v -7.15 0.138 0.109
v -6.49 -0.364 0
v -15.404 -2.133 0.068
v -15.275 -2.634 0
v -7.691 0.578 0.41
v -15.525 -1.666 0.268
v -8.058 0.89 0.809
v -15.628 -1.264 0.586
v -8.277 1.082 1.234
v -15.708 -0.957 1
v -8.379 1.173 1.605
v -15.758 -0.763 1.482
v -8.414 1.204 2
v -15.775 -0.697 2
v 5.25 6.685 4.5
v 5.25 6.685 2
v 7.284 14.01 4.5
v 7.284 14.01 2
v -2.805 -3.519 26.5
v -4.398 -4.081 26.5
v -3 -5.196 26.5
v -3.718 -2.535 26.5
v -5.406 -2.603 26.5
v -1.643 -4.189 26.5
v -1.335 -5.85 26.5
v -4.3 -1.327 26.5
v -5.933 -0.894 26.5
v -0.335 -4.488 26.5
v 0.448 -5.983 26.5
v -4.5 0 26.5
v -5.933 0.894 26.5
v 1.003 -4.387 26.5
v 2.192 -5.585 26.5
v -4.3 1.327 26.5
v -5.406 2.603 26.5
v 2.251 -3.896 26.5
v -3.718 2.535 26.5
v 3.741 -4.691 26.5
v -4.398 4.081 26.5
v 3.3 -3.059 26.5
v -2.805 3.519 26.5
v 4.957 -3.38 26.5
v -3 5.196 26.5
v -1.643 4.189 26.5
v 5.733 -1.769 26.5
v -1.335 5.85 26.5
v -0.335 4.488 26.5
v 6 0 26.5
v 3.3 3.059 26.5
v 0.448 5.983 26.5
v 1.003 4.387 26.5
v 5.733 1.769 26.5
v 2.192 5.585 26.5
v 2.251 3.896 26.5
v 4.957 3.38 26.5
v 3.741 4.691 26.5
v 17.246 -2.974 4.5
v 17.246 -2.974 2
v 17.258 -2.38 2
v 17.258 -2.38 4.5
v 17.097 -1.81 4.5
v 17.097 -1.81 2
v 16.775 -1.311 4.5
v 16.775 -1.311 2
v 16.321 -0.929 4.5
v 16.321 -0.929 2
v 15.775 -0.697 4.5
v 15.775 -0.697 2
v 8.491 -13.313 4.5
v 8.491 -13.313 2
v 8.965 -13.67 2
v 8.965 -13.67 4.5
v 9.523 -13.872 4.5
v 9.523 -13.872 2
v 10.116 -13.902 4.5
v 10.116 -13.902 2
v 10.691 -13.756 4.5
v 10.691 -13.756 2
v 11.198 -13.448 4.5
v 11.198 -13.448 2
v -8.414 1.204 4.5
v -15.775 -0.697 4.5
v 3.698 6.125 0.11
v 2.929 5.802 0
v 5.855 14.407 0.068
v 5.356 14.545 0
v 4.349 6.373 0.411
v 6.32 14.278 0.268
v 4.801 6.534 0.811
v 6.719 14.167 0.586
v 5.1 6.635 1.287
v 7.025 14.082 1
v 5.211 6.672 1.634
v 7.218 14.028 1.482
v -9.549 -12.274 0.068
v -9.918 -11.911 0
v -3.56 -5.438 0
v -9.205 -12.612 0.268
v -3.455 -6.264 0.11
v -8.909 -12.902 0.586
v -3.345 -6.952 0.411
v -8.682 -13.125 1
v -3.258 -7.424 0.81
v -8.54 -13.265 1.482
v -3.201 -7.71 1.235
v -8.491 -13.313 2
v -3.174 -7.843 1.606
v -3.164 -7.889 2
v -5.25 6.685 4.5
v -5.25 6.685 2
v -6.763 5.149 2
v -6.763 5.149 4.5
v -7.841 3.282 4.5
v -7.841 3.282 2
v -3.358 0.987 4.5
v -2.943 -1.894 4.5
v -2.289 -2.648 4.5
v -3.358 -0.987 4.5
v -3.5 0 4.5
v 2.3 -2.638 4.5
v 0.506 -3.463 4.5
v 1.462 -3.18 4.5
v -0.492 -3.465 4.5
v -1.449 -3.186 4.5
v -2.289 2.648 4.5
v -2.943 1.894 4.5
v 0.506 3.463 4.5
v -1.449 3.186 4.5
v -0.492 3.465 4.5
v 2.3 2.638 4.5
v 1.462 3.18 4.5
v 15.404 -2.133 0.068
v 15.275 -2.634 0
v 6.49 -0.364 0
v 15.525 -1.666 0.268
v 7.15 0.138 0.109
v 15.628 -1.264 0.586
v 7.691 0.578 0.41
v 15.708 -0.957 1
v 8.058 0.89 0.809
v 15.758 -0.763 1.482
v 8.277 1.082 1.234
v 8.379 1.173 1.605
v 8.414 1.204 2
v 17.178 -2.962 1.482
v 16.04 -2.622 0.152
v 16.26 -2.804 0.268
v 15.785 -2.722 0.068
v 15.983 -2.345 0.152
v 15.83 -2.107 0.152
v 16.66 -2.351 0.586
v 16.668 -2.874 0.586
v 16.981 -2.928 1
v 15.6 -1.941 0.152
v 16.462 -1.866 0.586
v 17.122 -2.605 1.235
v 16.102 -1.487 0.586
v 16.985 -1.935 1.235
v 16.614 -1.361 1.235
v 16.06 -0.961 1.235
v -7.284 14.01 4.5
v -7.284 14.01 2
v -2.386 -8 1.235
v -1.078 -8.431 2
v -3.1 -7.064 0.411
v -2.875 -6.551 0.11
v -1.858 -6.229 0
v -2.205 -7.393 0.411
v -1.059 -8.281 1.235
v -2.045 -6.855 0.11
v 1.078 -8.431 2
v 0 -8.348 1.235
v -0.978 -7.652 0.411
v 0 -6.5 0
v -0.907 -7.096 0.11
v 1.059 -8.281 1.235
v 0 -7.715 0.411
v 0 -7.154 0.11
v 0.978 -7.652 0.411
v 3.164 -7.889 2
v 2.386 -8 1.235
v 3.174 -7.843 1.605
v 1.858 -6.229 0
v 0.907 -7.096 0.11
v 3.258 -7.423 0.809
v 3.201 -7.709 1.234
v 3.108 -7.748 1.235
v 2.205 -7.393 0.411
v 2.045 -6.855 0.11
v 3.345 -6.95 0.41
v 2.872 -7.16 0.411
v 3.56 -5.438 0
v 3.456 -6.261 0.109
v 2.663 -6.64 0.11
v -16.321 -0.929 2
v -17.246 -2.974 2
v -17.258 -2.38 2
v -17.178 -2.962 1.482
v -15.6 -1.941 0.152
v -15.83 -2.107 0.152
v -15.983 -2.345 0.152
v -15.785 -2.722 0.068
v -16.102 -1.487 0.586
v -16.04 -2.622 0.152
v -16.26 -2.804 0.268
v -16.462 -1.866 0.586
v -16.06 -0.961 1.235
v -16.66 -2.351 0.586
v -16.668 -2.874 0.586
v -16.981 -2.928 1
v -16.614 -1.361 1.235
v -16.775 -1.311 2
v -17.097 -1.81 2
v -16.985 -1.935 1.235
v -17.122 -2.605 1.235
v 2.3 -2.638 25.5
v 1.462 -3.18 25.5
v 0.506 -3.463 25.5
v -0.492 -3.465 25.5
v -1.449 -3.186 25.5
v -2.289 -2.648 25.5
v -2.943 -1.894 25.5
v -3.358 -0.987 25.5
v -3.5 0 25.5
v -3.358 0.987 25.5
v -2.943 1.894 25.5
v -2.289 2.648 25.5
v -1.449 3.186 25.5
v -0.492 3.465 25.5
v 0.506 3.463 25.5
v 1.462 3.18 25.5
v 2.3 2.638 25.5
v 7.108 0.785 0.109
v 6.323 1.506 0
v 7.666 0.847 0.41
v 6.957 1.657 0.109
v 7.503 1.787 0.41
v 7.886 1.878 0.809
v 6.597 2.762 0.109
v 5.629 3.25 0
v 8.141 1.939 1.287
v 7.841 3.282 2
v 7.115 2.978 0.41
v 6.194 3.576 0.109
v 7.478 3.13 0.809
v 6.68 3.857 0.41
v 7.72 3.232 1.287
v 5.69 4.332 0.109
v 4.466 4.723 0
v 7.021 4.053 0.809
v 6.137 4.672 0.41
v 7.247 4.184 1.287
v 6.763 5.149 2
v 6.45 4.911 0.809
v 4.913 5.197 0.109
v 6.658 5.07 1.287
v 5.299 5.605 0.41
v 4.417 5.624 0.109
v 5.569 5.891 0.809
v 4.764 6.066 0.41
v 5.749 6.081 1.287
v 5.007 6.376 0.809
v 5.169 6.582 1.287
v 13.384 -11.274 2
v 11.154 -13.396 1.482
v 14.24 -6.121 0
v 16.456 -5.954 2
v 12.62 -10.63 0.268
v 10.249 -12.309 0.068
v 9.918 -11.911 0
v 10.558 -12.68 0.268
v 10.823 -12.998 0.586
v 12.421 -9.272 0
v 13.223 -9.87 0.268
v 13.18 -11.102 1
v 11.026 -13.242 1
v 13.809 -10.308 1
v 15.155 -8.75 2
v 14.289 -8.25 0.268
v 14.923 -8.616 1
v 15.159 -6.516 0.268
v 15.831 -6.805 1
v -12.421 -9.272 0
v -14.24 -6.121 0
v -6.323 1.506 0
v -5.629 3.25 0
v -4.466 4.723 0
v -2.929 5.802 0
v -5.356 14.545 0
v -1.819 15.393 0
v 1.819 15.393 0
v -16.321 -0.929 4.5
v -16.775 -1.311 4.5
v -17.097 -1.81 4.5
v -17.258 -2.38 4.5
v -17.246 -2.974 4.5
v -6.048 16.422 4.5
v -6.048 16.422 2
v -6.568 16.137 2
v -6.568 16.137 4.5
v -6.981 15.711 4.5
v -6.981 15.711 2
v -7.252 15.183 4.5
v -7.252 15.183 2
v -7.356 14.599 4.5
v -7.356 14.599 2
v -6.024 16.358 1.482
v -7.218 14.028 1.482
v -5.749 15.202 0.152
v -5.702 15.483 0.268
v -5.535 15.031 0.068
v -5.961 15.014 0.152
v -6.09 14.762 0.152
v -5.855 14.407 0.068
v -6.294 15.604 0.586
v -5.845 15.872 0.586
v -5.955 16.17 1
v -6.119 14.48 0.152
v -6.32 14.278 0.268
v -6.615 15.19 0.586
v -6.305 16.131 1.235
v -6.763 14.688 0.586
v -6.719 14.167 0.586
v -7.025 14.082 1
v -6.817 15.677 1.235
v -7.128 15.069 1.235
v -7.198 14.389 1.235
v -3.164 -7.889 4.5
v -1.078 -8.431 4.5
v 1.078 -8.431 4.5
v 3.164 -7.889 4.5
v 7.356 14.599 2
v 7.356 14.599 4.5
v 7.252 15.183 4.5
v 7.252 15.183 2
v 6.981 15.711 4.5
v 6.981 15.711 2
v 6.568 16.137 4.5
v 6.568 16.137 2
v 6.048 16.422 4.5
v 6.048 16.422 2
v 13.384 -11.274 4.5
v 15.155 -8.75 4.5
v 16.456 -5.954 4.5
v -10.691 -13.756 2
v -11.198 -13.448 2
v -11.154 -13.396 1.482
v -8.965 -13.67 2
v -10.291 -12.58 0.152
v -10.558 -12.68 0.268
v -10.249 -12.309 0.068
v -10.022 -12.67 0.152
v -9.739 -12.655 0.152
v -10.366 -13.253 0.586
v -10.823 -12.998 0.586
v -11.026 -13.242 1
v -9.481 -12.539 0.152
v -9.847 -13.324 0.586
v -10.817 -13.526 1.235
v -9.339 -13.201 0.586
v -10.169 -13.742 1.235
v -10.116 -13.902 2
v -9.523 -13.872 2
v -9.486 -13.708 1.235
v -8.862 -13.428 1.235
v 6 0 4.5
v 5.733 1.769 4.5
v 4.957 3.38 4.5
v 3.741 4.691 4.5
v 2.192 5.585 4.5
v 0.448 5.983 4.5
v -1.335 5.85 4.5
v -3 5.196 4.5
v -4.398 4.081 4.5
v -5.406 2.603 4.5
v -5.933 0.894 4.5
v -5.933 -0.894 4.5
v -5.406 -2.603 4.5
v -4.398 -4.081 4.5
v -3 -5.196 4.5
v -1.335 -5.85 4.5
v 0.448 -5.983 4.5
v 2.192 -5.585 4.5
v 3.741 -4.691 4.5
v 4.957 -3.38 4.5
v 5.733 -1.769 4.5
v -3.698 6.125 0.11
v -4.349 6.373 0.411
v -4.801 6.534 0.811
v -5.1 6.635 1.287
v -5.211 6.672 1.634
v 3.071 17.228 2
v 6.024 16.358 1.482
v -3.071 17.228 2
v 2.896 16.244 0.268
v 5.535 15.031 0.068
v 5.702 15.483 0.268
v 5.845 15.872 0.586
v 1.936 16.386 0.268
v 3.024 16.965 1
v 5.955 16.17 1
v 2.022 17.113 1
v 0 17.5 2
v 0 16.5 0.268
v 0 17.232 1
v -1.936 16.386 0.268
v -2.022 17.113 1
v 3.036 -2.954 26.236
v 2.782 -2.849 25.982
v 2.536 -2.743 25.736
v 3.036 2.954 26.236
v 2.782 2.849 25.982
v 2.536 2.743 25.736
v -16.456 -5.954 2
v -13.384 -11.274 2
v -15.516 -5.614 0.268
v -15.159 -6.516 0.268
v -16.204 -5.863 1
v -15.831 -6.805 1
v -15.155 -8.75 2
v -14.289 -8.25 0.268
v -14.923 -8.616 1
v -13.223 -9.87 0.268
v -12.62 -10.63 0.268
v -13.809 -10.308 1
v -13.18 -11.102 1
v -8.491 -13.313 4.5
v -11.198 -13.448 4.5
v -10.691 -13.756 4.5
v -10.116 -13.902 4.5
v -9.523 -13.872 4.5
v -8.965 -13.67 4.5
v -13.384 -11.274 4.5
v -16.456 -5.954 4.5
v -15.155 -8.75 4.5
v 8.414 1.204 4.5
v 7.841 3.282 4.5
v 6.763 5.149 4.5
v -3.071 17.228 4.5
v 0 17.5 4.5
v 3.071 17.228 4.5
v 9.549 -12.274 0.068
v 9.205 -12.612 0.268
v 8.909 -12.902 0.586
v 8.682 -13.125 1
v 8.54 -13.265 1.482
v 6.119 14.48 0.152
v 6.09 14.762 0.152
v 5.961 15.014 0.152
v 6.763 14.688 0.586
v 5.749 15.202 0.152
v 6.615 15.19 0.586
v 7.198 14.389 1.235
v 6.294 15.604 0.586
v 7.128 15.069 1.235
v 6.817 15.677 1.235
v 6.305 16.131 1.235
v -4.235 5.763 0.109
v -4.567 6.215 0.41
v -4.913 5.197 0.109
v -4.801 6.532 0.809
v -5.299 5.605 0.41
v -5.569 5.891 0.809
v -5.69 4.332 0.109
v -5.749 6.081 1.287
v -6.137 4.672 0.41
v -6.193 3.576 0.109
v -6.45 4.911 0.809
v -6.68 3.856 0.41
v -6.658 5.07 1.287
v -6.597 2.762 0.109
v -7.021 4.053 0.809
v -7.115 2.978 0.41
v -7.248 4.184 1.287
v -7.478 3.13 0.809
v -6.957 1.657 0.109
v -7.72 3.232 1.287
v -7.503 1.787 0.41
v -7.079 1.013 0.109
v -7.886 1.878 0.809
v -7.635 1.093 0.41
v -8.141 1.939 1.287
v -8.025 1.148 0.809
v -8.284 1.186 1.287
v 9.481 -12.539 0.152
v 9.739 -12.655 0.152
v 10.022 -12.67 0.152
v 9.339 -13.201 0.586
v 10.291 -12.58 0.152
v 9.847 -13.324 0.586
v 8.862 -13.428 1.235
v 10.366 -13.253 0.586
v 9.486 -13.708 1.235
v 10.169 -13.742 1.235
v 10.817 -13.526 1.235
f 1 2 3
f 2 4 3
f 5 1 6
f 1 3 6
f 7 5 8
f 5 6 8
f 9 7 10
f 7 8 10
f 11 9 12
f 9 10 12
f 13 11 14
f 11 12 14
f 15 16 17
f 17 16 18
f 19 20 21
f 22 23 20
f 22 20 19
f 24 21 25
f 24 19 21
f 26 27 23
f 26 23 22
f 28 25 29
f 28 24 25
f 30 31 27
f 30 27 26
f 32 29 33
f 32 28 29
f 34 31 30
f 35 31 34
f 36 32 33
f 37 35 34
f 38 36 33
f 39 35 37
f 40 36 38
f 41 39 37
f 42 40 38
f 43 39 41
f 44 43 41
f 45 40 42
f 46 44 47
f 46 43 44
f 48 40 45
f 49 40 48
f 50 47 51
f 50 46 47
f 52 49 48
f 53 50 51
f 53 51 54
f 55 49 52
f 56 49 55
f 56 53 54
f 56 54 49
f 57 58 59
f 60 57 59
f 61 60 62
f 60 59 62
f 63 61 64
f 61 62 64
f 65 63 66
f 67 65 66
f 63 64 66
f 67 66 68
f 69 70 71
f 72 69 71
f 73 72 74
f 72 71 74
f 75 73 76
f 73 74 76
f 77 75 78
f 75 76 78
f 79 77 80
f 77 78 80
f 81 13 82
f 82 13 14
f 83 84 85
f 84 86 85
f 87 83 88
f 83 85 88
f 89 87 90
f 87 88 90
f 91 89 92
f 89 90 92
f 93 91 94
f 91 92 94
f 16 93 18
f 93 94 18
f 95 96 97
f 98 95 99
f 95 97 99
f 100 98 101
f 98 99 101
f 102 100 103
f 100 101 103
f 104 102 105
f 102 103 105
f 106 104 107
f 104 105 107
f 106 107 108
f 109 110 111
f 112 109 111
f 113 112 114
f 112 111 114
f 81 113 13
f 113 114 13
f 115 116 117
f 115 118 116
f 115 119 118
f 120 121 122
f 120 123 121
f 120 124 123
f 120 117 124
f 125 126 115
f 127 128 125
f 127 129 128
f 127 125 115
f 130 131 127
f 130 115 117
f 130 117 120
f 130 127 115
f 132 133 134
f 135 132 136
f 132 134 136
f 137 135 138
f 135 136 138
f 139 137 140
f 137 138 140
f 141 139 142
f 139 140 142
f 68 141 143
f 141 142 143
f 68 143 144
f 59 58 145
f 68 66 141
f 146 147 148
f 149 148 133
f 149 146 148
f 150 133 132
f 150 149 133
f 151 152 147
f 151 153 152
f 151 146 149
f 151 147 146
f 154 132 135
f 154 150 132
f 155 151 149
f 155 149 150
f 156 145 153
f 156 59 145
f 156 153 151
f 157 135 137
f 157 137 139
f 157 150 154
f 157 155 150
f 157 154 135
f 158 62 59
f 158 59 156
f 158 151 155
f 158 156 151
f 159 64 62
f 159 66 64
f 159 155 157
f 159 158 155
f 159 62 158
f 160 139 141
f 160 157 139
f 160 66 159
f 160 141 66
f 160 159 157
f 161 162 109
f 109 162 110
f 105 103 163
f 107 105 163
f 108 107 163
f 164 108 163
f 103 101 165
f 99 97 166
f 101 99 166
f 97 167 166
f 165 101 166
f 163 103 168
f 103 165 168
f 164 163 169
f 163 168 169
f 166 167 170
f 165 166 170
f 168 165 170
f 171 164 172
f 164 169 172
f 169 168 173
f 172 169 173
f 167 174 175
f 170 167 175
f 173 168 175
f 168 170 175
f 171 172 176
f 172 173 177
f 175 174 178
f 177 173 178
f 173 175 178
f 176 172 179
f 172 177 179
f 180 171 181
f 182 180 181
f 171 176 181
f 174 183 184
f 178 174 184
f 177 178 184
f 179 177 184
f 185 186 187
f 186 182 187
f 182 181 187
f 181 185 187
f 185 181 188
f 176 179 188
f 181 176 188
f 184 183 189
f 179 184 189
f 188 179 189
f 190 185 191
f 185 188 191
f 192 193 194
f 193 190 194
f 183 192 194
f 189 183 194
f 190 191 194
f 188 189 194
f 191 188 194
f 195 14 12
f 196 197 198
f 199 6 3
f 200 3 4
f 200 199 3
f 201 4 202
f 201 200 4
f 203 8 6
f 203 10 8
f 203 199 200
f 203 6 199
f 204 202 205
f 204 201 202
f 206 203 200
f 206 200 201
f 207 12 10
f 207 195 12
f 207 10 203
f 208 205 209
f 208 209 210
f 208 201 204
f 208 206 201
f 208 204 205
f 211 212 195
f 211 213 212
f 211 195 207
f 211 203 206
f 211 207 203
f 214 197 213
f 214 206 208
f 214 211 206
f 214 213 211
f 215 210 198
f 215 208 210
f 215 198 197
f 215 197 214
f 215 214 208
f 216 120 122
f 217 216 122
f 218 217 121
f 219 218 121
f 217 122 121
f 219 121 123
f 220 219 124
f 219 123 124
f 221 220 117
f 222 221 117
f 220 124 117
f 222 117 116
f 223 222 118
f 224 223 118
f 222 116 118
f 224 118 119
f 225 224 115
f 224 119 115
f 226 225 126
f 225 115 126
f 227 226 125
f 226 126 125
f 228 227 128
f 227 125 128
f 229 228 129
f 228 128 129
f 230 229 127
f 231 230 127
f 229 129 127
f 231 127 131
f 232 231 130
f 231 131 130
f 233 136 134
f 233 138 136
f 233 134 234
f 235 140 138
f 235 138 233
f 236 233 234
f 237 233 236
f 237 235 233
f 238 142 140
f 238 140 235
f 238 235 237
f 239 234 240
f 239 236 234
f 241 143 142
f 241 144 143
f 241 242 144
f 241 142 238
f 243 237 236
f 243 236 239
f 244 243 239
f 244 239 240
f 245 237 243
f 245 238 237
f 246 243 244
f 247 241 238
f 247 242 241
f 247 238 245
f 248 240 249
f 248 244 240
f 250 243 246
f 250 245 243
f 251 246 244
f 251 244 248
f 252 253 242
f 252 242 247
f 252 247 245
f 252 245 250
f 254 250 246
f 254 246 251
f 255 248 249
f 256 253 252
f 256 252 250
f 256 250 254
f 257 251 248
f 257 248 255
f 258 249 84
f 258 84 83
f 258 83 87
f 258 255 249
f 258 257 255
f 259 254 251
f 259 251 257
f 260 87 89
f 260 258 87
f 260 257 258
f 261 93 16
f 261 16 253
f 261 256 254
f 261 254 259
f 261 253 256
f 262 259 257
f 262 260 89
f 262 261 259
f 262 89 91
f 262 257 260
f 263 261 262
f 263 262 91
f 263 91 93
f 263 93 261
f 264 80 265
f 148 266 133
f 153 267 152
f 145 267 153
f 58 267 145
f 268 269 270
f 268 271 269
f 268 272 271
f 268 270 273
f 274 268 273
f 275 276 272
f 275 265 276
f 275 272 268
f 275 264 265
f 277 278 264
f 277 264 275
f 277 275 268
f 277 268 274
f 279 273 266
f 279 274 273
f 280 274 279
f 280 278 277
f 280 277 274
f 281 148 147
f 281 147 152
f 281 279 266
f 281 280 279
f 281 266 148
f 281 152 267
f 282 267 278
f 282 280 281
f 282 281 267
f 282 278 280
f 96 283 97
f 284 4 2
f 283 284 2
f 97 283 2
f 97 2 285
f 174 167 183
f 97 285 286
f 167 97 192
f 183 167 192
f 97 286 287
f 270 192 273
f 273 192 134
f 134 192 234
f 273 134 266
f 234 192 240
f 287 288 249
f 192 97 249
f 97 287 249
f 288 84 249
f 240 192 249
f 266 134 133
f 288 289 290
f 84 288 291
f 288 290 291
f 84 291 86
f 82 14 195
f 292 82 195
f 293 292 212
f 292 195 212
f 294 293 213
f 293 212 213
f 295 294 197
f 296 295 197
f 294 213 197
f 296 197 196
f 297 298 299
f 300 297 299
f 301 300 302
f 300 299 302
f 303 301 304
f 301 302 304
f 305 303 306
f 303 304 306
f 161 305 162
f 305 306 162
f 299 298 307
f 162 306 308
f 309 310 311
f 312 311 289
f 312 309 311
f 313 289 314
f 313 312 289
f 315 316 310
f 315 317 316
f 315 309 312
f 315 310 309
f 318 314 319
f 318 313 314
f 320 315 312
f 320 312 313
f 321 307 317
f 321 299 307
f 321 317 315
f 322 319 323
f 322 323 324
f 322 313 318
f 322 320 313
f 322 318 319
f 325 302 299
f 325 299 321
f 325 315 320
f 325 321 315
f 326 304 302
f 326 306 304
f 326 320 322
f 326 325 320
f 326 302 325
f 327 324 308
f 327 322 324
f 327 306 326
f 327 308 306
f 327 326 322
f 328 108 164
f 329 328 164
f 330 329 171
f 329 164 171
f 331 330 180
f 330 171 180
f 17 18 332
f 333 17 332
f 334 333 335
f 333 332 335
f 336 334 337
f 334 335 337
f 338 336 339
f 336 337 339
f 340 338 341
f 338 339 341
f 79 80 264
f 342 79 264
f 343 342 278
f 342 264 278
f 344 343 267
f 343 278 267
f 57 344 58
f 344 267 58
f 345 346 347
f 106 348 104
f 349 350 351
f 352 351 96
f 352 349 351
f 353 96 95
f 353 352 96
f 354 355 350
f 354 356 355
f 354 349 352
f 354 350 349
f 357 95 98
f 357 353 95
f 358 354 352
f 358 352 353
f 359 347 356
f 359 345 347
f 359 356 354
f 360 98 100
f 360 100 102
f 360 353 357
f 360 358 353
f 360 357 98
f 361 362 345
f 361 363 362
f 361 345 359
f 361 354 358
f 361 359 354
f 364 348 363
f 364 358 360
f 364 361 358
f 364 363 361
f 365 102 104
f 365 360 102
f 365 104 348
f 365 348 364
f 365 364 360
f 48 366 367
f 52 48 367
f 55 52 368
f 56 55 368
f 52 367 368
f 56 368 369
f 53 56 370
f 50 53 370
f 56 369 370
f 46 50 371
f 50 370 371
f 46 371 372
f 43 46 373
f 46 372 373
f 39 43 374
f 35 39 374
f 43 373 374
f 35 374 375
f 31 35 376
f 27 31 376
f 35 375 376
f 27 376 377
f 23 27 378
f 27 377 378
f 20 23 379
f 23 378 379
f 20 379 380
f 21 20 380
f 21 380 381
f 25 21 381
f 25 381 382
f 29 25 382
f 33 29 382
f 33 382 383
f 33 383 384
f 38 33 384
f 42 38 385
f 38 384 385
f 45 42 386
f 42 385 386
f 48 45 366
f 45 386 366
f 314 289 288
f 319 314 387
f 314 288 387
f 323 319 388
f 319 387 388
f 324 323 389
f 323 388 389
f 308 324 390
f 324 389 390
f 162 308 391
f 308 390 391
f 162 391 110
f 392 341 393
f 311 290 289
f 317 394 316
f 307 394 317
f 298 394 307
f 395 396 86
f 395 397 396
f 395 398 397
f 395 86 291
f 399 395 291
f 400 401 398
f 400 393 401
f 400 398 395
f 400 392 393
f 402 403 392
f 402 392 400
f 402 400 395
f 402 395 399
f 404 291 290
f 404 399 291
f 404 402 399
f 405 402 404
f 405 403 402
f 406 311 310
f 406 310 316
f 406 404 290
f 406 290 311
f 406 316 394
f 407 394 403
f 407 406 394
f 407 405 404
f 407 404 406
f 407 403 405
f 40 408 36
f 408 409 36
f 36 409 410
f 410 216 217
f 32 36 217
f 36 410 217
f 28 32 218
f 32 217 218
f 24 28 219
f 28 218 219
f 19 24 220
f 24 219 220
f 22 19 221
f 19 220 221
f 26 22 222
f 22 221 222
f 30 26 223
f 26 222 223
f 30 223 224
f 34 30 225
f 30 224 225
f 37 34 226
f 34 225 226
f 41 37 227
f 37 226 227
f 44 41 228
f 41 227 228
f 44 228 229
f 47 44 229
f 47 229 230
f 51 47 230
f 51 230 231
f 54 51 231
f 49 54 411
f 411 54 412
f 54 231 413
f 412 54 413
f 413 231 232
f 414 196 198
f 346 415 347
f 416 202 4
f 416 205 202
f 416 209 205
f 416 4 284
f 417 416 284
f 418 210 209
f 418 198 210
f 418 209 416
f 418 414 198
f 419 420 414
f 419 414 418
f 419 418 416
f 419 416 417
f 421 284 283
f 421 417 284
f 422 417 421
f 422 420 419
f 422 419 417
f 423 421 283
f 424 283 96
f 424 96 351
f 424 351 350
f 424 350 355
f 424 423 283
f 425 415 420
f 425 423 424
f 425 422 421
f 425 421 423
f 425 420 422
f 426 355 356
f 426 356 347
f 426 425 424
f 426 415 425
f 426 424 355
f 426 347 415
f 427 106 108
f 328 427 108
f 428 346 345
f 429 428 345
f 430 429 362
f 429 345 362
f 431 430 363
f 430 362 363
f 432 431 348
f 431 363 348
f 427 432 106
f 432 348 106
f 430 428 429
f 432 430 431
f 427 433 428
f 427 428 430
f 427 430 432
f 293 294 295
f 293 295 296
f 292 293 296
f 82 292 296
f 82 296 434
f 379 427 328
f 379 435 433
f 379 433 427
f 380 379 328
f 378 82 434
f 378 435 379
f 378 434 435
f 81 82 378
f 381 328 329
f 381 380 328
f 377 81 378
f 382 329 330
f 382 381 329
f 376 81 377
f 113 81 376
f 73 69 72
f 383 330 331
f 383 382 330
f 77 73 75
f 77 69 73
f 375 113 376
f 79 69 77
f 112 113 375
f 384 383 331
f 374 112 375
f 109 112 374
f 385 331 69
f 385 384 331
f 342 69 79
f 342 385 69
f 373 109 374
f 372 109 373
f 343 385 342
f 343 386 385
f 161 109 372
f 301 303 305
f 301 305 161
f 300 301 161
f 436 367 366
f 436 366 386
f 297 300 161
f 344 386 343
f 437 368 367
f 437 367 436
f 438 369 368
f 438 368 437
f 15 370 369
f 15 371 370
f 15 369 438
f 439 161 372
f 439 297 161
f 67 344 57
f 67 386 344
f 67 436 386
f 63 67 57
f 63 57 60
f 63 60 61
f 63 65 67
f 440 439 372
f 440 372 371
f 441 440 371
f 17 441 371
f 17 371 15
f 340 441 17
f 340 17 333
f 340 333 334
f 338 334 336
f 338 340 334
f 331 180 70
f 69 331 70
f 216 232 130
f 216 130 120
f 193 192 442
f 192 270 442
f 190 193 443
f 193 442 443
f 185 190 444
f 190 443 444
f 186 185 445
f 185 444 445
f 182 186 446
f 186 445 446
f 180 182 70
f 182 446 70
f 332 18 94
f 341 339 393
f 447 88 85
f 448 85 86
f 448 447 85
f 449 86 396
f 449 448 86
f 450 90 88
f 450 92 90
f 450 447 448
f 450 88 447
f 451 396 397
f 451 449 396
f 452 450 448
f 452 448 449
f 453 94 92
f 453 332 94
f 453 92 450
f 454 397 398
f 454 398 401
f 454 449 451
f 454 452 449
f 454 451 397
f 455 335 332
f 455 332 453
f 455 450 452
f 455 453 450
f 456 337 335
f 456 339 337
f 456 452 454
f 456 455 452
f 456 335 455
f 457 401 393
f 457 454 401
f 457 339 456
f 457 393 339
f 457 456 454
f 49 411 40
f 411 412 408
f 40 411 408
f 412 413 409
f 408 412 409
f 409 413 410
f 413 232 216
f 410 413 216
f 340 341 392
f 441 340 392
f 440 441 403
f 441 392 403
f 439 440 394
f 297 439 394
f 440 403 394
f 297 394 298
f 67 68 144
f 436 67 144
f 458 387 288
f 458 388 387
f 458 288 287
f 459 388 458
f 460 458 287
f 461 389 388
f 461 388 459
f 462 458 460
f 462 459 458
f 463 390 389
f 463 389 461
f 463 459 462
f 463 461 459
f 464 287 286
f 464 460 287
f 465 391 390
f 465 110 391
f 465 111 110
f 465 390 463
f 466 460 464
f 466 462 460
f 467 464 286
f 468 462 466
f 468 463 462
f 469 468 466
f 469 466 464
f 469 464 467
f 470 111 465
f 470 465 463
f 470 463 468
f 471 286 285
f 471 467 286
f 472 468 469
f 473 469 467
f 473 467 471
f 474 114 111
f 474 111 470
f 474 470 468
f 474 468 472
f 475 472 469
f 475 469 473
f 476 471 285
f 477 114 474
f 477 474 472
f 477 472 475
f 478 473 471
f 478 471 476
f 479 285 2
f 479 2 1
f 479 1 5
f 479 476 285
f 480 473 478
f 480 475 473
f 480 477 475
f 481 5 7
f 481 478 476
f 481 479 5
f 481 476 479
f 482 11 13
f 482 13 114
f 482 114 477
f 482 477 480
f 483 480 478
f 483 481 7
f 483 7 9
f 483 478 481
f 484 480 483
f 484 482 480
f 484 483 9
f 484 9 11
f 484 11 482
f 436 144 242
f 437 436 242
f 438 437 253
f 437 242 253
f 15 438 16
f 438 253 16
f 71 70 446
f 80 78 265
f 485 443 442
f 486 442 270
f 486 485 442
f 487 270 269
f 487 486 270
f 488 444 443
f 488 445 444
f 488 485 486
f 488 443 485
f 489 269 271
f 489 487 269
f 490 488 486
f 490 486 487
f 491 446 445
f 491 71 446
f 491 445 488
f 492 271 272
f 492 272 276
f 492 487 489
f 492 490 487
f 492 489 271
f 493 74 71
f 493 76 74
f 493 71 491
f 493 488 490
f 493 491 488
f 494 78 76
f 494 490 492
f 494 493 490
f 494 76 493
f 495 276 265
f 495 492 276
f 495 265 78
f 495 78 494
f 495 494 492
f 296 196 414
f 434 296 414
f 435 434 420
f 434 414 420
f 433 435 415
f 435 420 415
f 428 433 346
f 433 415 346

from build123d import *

# Parameters (mm, degrees)
F1_DEPTH = 4.5
F2_R     = 6
F3_DEPTH = 22
F4_R     = 2
F5_SIZE  = 1


with BuildPart() as f1:
    # F0 (on Top) → F1 (new body)
    with BuildSketch(Plane.XY):
        with BuildLine():
            Line((-8.4913125212, -13.3127669957), (-3.1642680885, -7.8890688591))
            ThreePointArc((-3.1642680885, -7.8890688591), (0, -8.5), (3.1642680885, -7.8890688591))
            Line((3.1642680885, -7.8890688591), (8.4913125212, -13.3127669957))
            ThreePointArc((8.4913125212, -13.3127669957), (9.8181818622, -13.9088228343), (11.1979483169, -13.4482695352))
            ThreePointArc((11.1979483169, -13.4482695352), (15.1554445662, -8.75), (17.2455172129, -2.9735729451))
            ThreePointArc((17.2455172129, -2.9735729451), (16.9544848424, -1.5483834945), (15.7748506735, -0.6973088569))
            Line((15.7748506735, -0.6973088569), (8.4142680885, 1.2041978806))
            ThreePointArc((8.4142680885, 1.2041978806), (7.3612159322, 4.25), (5.25, 6.6848709786))
            Line((5.25, 6.6848709786), (7.2835381524, 14.0100758527))
            ThreePointArc((7.2835381524, 14.0100758527), (7.1363029802, 15.4572063288), (6.047568896, 16.4218424803))
            ThreePointArc((6.047568896, 16.4218424803), (0, 17.5), (-6.047568896, 16.4218424803))
            ThreePointArc((-6.047568896, 16.4218424803), (-7.1363029802, 15.4572063288), (-7.2835381524, 14.0100758527))
            Line((-7.2835381524, 14.0100758527), (-5.25, 6.6848709786))
            ThreePointArc((-5.25, 6.6848709786), (-7.3612159322, 4.25), (-8.4142680885, 1.2041978806))
            Line((-8.4142680885, 1.2041978806), (-15.7748506735, -0.6973088569))
            ThreePointArc((-15.7748506735, -0.6973088569), (-16.9544848424, -1.5483834945), (-17.2455172129, -2.9735729451))
            ThreePointArc((-17.2455172129, -2.9735729451), (-15.1554445662, -8.75), (-11.1979483169, -13.4482695352))
            ThreePointArc((-11.1979483169, -13.4482695352), (-9.8181818622, -13.9088228343), (-8.4913125212, -13.3127669957))
        make_face()
    extrude(amount=F1_DEPTH)

    # F2 (on face) → F3 (join)
    with BuildSketch(Plane.XY.offset(4.5)):
        Circle(F2_R)
        with BuildLine():
            ThreePointArc((2.3, -2.6381811917), (-3.5, 0), (2.3, 2.6381811917))
            Line((2.3, 2.6381811917), (2.3, -2.6381811917))
        make_face(mode=Mode.SUBTRACT)
    extrude(amount=F3_DEPTH)

    # F4
    f4_edges = [f1.edges().sort_by_distance(p)[0] for p in [
        (-6.266769, 10.347473, 0),
        (-12.094559, 0.253445, 0),
        (15.155445, -8.75, 0),
        (7.361216, 4.25, 0),
        (0, -8.5, 0),
        (-7.361216, 4.25, 0),
    ]]
    fillet(f4_edges, radius=F4_R)

    # F5
    f5_edges = [f1.edges().sort_by_distance(p)[0] for p in [
        (-3.5, 0, 26.5),
        (2.3, 0, 26.5),
    ]]
    chamfer(f5_edges, length=F5_SIZE)


solid = f1.part
